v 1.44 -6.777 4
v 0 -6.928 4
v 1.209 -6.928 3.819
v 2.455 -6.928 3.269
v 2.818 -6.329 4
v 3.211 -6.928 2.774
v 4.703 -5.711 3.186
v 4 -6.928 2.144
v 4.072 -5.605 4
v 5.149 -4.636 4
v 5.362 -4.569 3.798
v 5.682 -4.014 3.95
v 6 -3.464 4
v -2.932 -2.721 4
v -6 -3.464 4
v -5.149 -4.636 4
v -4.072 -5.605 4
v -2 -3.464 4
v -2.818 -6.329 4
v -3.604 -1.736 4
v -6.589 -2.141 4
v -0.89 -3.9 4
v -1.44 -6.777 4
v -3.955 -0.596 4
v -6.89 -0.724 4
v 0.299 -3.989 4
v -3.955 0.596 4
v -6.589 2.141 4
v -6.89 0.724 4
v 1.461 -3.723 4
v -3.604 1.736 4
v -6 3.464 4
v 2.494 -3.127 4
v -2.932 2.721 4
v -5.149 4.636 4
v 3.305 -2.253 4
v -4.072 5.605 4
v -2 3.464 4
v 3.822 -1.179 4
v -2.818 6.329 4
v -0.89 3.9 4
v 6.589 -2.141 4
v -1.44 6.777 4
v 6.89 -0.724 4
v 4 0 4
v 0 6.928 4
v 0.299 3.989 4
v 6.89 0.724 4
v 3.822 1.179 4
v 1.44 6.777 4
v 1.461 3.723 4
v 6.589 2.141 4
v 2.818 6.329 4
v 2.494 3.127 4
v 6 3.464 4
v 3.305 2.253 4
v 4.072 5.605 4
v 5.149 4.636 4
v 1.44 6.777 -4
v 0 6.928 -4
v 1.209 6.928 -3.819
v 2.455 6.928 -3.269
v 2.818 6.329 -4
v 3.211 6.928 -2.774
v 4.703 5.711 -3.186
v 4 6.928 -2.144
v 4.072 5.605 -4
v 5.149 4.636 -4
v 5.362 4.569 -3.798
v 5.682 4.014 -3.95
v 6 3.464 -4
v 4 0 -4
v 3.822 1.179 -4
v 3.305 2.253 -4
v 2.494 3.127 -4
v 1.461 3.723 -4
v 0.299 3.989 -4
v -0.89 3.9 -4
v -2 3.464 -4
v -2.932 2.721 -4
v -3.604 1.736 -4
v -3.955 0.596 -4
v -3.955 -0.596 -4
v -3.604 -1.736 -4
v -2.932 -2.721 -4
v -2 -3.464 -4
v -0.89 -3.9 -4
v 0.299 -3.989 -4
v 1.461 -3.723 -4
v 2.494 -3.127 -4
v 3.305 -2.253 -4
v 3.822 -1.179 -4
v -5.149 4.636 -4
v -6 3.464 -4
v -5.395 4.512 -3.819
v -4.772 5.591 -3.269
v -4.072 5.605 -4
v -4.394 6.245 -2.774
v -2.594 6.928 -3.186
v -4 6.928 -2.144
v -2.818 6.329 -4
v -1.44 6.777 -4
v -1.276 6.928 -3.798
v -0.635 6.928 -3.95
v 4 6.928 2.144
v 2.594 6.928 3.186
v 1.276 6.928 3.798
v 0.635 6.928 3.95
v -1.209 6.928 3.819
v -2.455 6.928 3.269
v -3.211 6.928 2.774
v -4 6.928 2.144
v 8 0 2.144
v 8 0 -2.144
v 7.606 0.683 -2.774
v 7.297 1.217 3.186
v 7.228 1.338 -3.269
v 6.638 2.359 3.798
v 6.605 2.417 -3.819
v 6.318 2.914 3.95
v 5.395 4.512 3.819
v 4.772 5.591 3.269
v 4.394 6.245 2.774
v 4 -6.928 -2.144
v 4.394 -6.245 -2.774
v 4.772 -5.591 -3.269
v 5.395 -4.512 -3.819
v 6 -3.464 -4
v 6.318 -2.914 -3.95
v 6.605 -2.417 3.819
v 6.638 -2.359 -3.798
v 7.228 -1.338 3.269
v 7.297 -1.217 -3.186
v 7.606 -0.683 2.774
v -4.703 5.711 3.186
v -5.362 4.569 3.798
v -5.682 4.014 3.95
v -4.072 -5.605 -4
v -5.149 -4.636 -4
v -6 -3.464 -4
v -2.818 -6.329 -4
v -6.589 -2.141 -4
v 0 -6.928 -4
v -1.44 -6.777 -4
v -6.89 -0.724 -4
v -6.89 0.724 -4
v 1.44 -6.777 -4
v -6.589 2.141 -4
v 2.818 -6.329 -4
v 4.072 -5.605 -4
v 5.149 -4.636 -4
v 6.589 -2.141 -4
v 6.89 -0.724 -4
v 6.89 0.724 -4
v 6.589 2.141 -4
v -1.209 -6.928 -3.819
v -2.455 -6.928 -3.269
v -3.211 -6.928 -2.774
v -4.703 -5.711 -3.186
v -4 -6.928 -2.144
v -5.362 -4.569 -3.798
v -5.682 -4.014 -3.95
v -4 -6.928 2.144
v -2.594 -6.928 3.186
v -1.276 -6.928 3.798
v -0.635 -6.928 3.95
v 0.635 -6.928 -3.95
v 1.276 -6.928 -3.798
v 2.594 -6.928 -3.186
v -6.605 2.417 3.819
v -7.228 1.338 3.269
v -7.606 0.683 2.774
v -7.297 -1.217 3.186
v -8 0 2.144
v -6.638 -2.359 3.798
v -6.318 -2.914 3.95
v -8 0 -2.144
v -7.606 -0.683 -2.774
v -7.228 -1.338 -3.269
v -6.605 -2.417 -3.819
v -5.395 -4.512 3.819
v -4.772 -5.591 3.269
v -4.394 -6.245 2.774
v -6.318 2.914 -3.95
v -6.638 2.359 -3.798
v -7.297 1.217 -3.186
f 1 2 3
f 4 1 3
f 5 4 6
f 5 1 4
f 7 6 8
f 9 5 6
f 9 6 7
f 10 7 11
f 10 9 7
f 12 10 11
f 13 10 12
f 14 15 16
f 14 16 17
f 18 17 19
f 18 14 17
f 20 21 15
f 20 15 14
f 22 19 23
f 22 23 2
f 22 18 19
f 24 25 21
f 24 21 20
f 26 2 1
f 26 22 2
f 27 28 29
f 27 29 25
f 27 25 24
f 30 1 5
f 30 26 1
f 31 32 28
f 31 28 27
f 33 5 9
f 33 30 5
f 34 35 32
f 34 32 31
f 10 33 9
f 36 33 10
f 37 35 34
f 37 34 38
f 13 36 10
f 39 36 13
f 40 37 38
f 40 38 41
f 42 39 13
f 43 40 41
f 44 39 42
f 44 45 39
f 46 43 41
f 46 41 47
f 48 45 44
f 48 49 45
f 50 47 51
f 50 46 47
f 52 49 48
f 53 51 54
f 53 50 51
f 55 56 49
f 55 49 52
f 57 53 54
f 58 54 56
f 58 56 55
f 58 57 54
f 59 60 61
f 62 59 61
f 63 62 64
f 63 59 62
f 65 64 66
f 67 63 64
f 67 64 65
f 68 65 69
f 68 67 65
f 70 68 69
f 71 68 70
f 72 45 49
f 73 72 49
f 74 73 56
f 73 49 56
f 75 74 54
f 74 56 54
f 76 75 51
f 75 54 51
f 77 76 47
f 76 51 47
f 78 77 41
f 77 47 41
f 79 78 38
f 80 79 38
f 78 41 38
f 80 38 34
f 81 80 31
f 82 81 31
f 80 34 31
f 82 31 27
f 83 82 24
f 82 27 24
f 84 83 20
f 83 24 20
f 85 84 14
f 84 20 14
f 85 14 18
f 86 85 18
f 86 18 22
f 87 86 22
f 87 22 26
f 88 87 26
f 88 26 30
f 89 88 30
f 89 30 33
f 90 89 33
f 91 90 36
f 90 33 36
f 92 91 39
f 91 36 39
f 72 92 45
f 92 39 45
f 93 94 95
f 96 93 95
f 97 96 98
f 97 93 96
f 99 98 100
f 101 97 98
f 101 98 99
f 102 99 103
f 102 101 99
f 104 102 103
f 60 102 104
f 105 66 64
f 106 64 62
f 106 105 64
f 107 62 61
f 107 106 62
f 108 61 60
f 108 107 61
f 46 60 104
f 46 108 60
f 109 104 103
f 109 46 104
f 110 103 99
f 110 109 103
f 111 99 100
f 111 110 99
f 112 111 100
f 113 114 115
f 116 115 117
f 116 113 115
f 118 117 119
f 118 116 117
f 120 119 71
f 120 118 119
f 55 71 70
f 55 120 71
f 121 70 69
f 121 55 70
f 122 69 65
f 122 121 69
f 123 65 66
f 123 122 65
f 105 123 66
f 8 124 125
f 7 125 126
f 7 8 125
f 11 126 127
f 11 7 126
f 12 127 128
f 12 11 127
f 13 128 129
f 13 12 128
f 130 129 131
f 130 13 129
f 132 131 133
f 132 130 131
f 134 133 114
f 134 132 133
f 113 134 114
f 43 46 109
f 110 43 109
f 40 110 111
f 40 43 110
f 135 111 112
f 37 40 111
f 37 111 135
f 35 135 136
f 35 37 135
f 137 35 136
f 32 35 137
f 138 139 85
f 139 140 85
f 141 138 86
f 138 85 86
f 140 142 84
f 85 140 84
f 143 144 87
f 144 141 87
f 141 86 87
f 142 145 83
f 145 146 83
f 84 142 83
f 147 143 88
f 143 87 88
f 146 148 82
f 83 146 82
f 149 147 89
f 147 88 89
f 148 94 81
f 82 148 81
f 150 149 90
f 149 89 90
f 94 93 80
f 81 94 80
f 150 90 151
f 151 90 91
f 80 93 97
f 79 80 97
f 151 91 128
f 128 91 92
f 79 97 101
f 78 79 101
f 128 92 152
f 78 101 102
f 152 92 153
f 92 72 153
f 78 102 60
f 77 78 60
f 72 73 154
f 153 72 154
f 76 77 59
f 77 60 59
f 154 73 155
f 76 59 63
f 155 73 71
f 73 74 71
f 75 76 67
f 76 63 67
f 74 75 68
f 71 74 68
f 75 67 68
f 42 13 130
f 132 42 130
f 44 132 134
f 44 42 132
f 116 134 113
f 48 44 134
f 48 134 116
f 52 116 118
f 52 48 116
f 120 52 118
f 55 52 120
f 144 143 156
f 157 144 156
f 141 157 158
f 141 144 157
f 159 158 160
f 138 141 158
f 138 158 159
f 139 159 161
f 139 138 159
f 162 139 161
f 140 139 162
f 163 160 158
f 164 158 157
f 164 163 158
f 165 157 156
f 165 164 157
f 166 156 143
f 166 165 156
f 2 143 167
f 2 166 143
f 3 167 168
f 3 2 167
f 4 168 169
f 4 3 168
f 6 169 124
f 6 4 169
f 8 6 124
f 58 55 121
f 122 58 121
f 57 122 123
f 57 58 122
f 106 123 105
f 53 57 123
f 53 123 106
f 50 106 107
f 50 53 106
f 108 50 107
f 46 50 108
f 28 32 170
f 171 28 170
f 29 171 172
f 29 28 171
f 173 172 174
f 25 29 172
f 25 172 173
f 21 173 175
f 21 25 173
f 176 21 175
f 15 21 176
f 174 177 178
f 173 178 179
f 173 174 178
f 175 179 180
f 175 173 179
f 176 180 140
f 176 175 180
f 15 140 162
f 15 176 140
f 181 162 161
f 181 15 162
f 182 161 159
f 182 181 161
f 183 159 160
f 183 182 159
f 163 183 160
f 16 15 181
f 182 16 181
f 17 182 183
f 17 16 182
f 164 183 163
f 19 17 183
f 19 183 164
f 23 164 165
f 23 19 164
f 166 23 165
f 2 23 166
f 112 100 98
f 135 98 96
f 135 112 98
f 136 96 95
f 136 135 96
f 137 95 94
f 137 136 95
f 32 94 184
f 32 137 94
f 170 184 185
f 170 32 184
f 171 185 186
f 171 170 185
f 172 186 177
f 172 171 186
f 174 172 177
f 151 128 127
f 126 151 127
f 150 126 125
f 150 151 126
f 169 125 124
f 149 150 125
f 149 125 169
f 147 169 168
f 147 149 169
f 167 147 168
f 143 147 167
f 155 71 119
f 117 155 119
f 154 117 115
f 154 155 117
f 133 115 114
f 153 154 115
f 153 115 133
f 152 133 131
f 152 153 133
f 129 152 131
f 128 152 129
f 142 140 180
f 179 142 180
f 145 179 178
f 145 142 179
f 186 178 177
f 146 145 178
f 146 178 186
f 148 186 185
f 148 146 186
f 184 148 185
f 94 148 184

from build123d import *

# Parameters (mm, degrees)
BOSS_EXTRUDE1_DEPTH     = 4
SKETCH2_OUTSIDE_W       = 31.764
SKETCH2_OUTSIDE_H       = 29.62
SKETCH2_OUTSIDE_R       = 6.92820323
CUT_EXTRUDE1_DEPTH      = 8
CUT_EXTRUDE1_DRAFT      = -30
MIRROR1_COPY_1_SKETCH_W = 31.764
MIRROR1_COPY_1_SKETCH_H = 29.62
MIRROR1_COPY_1_SKETCH_R = 6.92820323
MIRROR1_COPY_1_DEPTH    = 8
MIRROR1_COPY_1_DRAFT    = -30
SKETCH3_R               = 4
CUT_EXTRUDE2_DEPTH      = 8


with BuildPart() as part:
    # Sketch1 → Boss-Extrude1 (new, symmetric)
    with BuildSketch(Plane.XY):
        Polygon((8, 0), (4, 6.92820323), (-4, 6.92820323), (-8, 0), (-4, -6.92820323), (4, -6.92820323), align=None)
    extrude(amount=BOSS_EXTRUDE1_DEPTH, both=True)


with BuildPart() as cut_extrude1_tool:
    # Sketch2 outside → Cut-Extrude1 (with draft: the straight prism first)
    with BuildSketch(Plane.XY.offset(4)):
        Rectangle(SKETCH2_OUTSIDE_W, SKETCH2_OUTSIDE_H)
        Circle(SKETCH2_OUTSIDE_R, mode=Mode.SUBTRACT)
    extrude(amount=-CUT_EXTRUDE1_DEPTH)
    # Cut-Extrude1: the draft: its side faces are tilted about the plane it starts from
    cut_extrude1_sides = [cut_extrude1_tool.faces().sort_by_distance(p)[0] for p in [
        (0, -14.81, 0),
        (15.882, 0, 0),
        (0, 14.81, 0),
        (-15.882, 0, 0),
        (-6.92820323, 0, 0),
    ]]
    draft(cut_extrude1_sides, Plane.XY.offset(4), CUT_EXTRUDE1_DRAFT)


with BuildPart() as part_1:
    add(part.part)

    # Cut-Extrude1: cut by cut_extrude1_tool
    add(cut_extrude1_tool.part, mode=Mode.SUBTRACT)


with BuildPart() as mirror1_copy_1_tool:
    # Mirror1 copy 1 sketch → Mirror1 copy 1 (with draft: the straight prism first)
    with BuildSketch(Plane(origin=(0, 0, -4), x_dir=(1, 0, 0), z_dir=(0, 0, -1))):
        Rectangle(MIRROR1_COPY_1_SKETCH_W, MIRROR1_COPY_1_SKETCH_H)
        Circle(MIRROR1_COPY_1_SKETCH_R, mode=Mode.SUBTRACT)
    extrude(amount=-MIRROR1_COPY_1_DEPTH)
    # Mirror1 copy 1: the draft: its side faces are tilted about the plane it starts from
    mirror1_copy_1_sides = [mirror1_copy_1_tool.faces().sort_by_distance(p)[0] for p in [
        (0, -14.81, 0),
        (15.882, 0, 0),
        (0, 14.81, 0),
        (-15.882, 0, 0),
        (-6.92820323, 0, 0),
    ]]
    draft(mirror1_copy_1_sides, Plane(origin=(0, 0, -4), x_dir=(1, 0, 0), z_dir=(0, 0, -1)), MIRROR1_COPY_1_DRAFT)


with BuildPart() as part_2:
    add(part_1.part)

    # Mirror1 copy 1: cut by mirror1_copy_1_tool
    add(mirror1_copy_1_tool.part, mode=Mode.SUBTRACT)

    # Sketch3 → Cut-Extrude2 (cut)
    with BuildSketch(Plane.XY.offset(4)):
        Circle(SKETCH3_R)
    extrude(amount=-CUT_EXTRUDE2_DEPTH, mode=Mode.SUBTRACT)


solid = part_2.part
